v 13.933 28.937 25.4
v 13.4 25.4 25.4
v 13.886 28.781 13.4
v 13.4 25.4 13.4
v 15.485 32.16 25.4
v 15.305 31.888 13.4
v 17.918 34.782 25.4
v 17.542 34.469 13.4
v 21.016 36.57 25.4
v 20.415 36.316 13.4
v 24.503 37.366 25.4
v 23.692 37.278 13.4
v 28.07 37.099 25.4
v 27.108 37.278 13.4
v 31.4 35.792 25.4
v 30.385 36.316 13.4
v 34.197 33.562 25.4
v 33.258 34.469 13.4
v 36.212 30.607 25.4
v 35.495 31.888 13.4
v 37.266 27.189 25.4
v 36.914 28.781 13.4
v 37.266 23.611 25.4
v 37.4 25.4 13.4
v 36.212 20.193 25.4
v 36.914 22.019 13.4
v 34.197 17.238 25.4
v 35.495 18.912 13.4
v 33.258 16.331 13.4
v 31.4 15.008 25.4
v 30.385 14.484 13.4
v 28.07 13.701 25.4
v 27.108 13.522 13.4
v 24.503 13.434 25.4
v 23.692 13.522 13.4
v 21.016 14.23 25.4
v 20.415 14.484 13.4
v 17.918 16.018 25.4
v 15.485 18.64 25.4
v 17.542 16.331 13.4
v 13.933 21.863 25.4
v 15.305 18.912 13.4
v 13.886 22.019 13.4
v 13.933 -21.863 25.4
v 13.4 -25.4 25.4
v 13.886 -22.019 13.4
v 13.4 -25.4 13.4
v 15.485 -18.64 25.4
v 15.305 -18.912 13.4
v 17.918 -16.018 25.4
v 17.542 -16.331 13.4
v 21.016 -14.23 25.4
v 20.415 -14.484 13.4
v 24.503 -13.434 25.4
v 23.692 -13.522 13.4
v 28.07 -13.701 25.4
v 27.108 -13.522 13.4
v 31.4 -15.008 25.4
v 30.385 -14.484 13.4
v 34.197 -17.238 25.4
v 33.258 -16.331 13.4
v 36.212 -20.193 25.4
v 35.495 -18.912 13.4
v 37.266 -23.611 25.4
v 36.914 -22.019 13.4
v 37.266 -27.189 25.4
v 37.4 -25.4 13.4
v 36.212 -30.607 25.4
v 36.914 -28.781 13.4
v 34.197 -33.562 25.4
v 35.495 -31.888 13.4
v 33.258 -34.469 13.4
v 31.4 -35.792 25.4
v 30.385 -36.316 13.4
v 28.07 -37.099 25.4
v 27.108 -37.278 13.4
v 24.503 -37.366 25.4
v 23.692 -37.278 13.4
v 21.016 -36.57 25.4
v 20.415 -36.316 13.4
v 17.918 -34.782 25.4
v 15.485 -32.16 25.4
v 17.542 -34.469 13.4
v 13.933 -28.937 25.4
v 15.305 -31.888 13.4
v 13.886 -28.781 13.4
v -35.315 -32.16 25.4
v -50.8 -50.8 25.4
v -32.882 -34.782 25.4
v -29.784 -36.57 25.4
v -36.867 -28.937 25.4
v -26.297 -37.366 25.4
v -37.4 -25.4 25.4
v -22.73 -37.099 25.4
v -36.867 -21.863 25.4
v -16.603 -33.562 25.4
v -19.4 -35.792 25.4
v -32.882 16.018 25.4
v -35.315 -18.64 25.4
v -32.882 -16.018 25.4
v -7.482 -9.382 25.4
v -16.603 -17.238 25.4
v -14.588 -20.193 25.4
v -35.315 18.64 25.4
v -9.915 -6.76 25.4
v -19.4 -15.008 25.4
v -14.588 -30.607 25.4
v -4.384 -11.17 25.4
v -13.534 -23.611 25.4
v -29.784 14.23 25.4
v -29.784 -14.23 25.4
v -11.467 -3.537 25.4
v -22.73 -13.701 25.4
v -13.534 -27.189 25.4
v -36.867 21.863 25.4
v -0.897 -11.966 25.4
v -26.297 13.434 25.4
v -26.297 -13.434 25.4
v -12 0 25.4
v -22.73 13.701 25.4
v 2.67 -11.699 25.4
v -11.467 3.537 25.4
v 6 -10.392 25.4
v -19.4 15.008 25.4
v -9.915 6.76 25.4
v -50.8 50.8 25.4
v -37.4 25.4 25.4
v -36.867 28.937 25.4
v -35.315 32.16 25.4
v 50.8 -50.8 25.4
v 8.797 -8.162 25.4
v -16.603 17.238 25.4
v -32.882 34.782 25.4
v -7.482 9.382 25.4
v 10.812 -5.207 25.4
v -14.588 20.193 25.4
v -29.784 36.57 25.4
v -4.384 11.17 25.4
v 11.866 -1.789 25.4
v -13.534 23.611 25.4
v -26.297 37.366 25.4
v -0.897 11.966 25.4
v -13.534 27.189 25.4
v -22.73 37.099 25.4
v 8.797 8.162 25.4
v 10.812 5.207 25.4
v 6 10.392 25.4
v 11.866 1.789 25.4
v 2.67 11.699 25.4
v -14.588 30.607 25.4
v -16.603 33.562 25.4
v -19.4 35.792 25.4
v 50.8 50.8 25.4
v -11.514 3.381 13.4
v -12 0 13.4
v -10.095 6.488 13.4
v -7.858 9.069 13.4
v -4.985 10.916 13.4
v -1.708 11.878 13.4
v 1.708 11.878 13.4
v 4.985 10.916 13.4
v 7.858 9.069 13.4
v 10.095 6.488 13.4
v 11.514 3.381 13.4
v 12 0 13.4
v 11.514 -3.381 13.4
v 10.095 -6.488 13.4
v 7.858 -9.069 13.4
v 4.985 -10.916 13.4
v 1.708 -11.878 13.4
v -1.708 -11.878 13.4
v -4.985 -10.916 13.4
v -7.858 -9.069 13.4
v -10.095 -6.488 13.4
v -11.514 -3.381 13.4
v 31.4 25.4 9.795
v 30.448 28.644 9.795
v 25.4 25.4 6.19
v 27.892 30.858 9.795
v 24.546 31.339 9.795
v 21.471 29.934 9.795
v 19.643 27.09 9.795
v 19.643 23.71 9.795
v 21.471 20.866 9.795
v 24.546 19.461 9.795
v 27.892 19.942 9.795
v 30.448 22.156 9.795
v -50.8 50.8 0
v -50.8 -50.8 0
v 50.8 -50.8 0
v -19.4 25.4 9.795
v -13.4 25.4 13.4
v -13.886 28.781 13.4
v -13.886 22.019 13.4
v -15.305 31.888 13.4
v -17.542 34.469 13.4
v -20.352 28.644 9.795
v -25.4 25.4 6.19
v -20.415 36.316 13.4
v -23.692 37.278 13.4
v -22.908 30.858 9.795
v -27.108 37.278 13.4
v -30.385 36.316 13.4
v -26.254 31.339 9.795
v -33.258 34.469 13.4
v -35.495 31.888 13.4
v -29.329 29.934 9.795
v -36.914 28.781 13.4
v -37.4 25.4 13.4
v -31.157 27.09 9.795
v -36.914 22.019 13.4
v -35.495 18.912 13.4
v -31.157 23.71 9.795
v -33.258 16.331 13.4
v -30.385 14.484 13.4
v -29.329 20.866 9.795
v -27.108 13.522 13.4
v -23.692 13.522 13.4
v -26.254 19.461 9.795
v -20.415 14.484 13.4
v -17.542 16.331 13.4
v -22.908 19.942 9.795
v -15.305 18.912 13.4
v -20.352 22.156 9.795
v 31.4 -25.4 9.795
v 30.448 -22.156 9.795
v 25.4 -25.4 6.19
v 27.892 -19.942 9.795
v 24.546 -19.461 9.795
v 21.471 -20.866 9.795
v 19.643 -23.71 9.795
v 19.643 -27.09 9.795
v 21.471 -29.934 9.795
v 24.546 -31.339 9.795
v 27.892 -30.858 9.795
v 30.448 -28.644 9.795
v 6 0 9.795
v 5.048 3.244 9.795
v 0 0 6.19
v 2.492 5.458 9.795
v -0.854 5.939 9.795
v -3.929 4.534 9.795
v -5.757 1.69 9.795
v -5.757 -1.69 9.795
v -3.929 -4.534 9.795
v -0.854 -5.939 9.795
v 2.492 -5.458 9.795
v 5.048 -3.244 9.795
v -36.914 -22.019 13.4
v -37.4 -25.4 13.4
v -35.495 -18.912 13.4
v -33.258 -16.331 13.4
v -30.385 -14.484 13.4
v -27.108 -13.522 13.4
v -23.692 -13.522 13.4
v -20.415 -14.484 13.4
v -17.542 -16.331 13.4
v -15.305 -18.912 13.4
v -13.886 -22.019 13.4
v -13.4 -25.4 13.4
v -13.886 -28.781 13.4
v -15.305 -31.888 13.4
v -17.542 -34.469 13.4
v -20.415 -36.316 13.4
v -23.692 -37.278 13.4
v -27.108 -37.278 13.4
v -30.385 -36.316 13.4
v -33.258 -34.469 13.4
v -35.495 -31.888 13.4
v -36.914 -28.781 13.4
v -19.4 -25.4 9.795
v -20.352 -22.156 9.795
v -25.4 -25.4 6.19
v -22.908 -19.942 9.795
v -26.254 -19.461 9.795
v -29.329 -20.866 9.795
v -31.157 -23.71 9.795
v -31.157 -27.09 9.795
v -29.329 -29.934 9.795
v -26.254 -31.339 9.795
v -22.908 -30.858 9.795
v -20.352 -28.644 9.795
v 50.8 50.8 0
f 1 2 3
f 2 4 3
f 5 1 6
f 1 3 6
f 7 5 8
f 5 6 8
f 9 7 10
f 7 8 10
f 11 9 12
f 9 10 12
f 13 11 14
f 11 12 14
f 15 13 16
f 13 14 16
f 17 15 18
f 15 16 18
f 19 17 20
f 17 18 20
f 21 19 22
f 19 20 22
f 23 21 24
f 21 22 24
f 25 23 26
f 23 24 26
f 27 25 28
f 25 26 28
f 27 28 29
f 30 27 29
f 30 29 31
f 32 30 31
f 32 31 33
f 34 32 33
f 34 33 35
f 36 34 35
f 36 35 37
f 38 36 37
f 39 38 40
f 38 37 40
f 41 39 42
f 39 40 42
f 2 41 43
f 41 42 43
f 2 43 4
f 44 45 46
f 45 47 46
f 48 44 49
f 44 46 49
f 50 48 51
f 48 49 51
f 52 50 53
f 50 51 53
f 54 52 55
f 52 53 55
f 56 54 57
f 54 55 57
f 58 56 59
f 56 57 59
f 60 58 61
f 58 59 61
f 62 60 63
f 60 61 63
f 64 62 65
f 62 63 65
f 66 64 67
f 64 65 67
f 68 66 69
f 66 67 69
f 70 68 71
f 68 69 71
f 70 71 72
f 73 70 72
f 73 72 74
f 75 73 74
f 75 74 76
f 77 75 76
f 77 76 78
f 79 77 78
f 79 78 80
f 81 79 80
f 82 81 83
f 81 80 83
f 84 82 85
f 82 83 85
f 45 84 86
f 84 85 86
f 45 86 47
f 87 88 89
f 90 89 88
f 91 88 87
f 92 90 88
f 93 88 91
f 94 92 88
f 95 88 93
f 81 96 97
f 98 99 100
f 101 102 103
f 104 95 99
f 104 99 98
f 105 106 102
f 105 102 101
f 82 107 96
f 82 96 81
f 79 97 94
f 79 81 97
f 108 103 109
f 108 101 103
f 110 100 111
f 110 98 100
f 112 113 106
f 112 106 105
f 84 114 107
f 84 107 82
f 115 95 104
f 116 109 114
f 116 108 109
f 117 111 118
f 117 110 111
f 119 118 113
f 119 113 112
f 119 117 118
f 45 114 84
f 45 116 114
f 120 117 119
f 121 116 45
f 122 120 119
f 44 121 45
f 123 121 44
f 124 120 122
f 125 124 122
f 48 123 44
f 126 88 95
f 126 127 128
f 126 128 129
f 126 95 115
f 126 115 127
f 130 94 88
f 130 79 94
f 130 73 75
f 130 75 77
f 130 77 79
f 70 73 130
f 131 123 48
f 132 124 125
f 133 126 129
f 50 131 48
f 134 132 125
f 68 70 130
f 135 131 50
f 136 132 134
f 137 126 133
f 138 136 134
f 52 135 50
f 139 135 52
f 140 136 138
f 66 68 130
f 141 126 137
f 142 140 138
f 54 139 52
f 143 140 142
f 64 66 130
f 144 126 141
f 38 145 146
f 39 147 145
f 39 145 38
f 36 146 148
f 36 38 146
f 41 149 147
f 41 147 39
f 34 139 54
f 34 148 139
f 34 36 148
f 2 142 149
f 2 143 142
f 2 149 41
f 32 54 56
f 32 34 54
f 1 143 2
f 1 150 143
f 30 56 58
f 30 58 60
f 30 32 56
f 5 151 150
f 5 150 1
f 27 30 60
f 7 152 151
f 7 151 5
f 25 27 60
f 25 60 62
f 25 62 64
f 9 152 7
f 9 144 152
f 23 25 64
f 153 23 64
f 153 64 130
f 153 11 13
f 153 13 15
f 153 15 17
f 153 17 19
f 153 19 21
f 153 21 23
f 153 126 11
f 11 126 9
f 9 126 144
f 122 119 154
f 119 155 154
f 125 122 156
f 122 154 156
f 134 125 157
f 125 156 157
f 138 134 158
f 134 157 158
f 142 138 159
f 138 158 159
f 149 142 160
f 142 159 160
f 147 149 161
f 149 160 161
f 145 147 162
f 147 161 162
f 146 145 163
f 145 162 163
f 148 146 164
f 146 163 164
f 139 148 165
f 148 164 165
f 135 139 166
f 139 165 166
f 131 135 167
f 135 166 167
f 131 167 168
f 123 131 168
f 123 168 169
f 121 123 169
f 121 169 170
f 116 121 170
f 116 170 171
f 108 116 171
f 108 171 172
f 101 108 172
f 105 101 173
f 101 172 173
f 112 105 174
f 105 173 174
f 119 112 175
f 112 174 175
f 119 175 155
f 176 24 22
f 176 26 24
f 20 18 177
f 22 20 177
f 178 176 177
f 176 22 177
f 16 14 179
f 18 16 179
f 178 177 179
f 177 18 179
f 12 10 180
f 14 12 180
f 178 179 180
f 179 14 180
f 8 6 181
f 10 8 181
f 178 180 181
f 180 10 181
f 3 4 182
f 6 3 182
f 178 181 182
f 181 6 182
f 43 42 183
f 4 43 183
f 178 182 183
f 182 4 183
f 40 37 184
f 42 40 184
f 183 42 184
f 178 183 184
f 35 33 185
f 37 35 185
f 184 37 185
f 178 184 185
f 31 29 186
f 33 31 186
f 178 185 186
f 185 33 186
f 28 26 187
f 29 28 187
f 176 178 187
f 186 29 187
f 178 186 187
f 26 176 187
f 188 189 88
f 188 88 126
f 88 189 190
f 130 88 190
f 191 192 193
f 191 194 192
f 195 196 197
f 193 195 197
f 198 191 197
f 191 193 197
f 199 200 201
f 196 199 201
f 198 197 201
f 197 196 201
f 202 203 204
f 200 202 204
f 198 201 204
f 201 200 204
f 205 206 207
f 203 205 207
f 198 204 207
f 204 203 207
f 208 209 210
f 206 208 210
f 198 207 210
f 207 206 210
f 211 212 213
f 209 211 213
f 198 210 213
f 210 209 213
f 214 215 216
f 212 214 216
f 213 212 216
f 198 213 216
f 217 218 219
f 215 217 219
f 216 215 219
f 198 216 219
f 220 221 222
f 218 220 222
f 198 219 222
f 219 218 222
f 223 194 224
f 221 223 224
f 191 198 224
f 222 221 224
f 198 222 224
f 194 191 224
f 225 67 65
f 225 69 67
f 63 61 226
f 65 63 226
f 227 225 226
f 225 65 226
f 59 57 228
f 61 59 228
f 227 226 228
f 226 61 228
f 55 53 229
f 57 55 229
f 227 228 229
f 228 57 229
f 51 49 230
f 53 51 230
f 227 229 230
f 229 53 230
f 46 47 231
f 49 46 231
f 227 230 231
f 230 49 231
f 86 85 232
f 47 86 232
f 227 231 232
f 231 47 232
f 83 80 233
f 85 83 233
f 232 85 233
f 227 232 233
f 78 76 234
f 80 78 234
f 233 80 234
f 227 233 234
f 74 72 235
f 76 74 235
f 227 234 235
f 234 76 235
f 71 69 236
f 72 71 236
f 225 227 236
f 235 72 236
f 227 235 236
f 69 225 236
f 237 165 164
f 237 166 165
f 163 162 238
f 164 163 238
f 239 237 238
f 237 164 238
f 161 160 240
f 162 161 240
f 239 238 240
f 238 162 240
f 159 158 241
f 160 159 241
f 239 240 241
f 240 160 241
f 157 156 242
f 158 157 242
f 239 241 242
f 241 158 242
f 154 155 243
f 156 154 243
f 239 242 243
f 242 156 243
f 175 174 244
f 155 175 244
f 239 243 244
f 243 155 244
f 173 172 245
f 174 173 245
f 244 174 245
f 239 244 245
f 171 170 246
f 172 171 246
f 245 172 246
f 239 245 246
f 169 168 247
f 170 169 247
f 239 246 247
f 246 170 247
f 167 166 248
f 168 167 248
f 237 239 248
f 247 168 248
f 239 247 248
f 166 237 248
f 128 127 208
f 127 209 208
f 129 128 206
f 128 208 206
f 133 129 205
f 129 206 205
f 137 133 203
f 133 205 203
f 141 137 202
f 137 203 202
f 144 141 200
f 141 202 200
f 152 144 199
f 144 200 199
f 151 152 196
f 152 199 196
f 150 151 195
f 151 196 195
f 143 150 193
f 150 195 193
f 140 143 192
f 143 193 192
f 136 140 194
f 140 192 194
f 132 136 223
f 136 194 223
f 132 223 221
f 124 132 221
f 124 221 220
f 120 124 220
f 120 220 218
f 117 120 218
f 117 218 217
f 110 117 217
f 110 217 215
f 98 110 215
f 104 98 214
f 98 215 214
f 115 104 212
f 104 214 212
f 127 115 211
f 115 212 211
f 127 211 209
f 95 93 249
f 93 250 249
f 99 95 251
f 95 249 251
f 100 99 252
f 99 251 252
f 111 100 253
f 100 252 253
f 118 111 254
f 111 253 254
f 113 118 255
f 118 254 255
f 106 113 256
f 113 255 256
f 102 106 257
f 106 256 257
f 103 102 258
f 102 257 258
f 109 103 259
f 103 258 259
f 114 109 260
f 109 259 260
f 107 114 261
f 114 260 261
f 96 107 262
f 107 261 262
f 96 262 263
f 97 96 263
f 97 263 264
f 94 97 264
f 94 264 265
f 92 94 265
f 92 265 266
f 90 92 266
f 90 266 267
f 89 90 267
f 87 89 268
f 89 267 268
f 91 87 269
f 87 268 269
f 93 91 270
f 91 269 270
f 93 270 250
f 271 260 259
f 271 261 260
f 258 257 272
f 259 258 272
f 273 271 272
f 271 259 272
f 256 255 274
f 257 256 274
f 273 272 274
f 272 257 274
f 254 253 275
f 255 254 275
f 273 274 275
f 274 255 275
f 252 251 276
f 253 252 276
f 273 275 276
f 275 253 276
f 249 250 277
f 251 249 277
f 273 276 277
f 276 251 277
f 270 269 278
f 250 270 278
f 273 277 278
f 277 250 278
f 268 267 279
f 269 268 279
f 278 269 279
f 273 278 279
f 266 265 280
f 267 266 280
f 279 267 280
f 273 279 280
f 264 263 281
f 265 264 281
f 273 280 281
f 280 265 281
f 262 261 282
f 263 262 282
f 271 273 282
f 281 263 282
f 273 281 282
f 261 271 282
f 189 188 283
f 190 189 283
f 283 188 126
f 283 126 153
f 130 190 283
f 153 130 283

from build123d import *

# Parameters (mm, degrees)
F0_W     = 101.6
F0_H     = 101.6
F1_DEPTH = 25.4
F3_D     = 24
F3_DEPTH = 12
F3_TIP   = 7.2103274283


with BuildPart() as f1:
    # F0 (on Top) → F1 (new body)
    with BuildSketch(Plane.XY):
        Rectangle(F0_W, F0_H)
    extrude(amount=F1_DEPTH)

    # F3
    with Locations(Plane.XY.offset(25.4)):
        with Locations((-25.4, 25.4), (25.4, 25.4), (0, 0), (25.4, -25.4), (-25.4, -25.4)):
            Hole(F3_D / 2, depth=F3_DEPTH)
            with Locations((0, 0, -(F3_DEPTH + F3_TIP / 2))):  # 118° drill point
                Cone(0, F3_D / 2, F3_TIP, mode=Mode.SUBTRACT)


solid = f1.part
